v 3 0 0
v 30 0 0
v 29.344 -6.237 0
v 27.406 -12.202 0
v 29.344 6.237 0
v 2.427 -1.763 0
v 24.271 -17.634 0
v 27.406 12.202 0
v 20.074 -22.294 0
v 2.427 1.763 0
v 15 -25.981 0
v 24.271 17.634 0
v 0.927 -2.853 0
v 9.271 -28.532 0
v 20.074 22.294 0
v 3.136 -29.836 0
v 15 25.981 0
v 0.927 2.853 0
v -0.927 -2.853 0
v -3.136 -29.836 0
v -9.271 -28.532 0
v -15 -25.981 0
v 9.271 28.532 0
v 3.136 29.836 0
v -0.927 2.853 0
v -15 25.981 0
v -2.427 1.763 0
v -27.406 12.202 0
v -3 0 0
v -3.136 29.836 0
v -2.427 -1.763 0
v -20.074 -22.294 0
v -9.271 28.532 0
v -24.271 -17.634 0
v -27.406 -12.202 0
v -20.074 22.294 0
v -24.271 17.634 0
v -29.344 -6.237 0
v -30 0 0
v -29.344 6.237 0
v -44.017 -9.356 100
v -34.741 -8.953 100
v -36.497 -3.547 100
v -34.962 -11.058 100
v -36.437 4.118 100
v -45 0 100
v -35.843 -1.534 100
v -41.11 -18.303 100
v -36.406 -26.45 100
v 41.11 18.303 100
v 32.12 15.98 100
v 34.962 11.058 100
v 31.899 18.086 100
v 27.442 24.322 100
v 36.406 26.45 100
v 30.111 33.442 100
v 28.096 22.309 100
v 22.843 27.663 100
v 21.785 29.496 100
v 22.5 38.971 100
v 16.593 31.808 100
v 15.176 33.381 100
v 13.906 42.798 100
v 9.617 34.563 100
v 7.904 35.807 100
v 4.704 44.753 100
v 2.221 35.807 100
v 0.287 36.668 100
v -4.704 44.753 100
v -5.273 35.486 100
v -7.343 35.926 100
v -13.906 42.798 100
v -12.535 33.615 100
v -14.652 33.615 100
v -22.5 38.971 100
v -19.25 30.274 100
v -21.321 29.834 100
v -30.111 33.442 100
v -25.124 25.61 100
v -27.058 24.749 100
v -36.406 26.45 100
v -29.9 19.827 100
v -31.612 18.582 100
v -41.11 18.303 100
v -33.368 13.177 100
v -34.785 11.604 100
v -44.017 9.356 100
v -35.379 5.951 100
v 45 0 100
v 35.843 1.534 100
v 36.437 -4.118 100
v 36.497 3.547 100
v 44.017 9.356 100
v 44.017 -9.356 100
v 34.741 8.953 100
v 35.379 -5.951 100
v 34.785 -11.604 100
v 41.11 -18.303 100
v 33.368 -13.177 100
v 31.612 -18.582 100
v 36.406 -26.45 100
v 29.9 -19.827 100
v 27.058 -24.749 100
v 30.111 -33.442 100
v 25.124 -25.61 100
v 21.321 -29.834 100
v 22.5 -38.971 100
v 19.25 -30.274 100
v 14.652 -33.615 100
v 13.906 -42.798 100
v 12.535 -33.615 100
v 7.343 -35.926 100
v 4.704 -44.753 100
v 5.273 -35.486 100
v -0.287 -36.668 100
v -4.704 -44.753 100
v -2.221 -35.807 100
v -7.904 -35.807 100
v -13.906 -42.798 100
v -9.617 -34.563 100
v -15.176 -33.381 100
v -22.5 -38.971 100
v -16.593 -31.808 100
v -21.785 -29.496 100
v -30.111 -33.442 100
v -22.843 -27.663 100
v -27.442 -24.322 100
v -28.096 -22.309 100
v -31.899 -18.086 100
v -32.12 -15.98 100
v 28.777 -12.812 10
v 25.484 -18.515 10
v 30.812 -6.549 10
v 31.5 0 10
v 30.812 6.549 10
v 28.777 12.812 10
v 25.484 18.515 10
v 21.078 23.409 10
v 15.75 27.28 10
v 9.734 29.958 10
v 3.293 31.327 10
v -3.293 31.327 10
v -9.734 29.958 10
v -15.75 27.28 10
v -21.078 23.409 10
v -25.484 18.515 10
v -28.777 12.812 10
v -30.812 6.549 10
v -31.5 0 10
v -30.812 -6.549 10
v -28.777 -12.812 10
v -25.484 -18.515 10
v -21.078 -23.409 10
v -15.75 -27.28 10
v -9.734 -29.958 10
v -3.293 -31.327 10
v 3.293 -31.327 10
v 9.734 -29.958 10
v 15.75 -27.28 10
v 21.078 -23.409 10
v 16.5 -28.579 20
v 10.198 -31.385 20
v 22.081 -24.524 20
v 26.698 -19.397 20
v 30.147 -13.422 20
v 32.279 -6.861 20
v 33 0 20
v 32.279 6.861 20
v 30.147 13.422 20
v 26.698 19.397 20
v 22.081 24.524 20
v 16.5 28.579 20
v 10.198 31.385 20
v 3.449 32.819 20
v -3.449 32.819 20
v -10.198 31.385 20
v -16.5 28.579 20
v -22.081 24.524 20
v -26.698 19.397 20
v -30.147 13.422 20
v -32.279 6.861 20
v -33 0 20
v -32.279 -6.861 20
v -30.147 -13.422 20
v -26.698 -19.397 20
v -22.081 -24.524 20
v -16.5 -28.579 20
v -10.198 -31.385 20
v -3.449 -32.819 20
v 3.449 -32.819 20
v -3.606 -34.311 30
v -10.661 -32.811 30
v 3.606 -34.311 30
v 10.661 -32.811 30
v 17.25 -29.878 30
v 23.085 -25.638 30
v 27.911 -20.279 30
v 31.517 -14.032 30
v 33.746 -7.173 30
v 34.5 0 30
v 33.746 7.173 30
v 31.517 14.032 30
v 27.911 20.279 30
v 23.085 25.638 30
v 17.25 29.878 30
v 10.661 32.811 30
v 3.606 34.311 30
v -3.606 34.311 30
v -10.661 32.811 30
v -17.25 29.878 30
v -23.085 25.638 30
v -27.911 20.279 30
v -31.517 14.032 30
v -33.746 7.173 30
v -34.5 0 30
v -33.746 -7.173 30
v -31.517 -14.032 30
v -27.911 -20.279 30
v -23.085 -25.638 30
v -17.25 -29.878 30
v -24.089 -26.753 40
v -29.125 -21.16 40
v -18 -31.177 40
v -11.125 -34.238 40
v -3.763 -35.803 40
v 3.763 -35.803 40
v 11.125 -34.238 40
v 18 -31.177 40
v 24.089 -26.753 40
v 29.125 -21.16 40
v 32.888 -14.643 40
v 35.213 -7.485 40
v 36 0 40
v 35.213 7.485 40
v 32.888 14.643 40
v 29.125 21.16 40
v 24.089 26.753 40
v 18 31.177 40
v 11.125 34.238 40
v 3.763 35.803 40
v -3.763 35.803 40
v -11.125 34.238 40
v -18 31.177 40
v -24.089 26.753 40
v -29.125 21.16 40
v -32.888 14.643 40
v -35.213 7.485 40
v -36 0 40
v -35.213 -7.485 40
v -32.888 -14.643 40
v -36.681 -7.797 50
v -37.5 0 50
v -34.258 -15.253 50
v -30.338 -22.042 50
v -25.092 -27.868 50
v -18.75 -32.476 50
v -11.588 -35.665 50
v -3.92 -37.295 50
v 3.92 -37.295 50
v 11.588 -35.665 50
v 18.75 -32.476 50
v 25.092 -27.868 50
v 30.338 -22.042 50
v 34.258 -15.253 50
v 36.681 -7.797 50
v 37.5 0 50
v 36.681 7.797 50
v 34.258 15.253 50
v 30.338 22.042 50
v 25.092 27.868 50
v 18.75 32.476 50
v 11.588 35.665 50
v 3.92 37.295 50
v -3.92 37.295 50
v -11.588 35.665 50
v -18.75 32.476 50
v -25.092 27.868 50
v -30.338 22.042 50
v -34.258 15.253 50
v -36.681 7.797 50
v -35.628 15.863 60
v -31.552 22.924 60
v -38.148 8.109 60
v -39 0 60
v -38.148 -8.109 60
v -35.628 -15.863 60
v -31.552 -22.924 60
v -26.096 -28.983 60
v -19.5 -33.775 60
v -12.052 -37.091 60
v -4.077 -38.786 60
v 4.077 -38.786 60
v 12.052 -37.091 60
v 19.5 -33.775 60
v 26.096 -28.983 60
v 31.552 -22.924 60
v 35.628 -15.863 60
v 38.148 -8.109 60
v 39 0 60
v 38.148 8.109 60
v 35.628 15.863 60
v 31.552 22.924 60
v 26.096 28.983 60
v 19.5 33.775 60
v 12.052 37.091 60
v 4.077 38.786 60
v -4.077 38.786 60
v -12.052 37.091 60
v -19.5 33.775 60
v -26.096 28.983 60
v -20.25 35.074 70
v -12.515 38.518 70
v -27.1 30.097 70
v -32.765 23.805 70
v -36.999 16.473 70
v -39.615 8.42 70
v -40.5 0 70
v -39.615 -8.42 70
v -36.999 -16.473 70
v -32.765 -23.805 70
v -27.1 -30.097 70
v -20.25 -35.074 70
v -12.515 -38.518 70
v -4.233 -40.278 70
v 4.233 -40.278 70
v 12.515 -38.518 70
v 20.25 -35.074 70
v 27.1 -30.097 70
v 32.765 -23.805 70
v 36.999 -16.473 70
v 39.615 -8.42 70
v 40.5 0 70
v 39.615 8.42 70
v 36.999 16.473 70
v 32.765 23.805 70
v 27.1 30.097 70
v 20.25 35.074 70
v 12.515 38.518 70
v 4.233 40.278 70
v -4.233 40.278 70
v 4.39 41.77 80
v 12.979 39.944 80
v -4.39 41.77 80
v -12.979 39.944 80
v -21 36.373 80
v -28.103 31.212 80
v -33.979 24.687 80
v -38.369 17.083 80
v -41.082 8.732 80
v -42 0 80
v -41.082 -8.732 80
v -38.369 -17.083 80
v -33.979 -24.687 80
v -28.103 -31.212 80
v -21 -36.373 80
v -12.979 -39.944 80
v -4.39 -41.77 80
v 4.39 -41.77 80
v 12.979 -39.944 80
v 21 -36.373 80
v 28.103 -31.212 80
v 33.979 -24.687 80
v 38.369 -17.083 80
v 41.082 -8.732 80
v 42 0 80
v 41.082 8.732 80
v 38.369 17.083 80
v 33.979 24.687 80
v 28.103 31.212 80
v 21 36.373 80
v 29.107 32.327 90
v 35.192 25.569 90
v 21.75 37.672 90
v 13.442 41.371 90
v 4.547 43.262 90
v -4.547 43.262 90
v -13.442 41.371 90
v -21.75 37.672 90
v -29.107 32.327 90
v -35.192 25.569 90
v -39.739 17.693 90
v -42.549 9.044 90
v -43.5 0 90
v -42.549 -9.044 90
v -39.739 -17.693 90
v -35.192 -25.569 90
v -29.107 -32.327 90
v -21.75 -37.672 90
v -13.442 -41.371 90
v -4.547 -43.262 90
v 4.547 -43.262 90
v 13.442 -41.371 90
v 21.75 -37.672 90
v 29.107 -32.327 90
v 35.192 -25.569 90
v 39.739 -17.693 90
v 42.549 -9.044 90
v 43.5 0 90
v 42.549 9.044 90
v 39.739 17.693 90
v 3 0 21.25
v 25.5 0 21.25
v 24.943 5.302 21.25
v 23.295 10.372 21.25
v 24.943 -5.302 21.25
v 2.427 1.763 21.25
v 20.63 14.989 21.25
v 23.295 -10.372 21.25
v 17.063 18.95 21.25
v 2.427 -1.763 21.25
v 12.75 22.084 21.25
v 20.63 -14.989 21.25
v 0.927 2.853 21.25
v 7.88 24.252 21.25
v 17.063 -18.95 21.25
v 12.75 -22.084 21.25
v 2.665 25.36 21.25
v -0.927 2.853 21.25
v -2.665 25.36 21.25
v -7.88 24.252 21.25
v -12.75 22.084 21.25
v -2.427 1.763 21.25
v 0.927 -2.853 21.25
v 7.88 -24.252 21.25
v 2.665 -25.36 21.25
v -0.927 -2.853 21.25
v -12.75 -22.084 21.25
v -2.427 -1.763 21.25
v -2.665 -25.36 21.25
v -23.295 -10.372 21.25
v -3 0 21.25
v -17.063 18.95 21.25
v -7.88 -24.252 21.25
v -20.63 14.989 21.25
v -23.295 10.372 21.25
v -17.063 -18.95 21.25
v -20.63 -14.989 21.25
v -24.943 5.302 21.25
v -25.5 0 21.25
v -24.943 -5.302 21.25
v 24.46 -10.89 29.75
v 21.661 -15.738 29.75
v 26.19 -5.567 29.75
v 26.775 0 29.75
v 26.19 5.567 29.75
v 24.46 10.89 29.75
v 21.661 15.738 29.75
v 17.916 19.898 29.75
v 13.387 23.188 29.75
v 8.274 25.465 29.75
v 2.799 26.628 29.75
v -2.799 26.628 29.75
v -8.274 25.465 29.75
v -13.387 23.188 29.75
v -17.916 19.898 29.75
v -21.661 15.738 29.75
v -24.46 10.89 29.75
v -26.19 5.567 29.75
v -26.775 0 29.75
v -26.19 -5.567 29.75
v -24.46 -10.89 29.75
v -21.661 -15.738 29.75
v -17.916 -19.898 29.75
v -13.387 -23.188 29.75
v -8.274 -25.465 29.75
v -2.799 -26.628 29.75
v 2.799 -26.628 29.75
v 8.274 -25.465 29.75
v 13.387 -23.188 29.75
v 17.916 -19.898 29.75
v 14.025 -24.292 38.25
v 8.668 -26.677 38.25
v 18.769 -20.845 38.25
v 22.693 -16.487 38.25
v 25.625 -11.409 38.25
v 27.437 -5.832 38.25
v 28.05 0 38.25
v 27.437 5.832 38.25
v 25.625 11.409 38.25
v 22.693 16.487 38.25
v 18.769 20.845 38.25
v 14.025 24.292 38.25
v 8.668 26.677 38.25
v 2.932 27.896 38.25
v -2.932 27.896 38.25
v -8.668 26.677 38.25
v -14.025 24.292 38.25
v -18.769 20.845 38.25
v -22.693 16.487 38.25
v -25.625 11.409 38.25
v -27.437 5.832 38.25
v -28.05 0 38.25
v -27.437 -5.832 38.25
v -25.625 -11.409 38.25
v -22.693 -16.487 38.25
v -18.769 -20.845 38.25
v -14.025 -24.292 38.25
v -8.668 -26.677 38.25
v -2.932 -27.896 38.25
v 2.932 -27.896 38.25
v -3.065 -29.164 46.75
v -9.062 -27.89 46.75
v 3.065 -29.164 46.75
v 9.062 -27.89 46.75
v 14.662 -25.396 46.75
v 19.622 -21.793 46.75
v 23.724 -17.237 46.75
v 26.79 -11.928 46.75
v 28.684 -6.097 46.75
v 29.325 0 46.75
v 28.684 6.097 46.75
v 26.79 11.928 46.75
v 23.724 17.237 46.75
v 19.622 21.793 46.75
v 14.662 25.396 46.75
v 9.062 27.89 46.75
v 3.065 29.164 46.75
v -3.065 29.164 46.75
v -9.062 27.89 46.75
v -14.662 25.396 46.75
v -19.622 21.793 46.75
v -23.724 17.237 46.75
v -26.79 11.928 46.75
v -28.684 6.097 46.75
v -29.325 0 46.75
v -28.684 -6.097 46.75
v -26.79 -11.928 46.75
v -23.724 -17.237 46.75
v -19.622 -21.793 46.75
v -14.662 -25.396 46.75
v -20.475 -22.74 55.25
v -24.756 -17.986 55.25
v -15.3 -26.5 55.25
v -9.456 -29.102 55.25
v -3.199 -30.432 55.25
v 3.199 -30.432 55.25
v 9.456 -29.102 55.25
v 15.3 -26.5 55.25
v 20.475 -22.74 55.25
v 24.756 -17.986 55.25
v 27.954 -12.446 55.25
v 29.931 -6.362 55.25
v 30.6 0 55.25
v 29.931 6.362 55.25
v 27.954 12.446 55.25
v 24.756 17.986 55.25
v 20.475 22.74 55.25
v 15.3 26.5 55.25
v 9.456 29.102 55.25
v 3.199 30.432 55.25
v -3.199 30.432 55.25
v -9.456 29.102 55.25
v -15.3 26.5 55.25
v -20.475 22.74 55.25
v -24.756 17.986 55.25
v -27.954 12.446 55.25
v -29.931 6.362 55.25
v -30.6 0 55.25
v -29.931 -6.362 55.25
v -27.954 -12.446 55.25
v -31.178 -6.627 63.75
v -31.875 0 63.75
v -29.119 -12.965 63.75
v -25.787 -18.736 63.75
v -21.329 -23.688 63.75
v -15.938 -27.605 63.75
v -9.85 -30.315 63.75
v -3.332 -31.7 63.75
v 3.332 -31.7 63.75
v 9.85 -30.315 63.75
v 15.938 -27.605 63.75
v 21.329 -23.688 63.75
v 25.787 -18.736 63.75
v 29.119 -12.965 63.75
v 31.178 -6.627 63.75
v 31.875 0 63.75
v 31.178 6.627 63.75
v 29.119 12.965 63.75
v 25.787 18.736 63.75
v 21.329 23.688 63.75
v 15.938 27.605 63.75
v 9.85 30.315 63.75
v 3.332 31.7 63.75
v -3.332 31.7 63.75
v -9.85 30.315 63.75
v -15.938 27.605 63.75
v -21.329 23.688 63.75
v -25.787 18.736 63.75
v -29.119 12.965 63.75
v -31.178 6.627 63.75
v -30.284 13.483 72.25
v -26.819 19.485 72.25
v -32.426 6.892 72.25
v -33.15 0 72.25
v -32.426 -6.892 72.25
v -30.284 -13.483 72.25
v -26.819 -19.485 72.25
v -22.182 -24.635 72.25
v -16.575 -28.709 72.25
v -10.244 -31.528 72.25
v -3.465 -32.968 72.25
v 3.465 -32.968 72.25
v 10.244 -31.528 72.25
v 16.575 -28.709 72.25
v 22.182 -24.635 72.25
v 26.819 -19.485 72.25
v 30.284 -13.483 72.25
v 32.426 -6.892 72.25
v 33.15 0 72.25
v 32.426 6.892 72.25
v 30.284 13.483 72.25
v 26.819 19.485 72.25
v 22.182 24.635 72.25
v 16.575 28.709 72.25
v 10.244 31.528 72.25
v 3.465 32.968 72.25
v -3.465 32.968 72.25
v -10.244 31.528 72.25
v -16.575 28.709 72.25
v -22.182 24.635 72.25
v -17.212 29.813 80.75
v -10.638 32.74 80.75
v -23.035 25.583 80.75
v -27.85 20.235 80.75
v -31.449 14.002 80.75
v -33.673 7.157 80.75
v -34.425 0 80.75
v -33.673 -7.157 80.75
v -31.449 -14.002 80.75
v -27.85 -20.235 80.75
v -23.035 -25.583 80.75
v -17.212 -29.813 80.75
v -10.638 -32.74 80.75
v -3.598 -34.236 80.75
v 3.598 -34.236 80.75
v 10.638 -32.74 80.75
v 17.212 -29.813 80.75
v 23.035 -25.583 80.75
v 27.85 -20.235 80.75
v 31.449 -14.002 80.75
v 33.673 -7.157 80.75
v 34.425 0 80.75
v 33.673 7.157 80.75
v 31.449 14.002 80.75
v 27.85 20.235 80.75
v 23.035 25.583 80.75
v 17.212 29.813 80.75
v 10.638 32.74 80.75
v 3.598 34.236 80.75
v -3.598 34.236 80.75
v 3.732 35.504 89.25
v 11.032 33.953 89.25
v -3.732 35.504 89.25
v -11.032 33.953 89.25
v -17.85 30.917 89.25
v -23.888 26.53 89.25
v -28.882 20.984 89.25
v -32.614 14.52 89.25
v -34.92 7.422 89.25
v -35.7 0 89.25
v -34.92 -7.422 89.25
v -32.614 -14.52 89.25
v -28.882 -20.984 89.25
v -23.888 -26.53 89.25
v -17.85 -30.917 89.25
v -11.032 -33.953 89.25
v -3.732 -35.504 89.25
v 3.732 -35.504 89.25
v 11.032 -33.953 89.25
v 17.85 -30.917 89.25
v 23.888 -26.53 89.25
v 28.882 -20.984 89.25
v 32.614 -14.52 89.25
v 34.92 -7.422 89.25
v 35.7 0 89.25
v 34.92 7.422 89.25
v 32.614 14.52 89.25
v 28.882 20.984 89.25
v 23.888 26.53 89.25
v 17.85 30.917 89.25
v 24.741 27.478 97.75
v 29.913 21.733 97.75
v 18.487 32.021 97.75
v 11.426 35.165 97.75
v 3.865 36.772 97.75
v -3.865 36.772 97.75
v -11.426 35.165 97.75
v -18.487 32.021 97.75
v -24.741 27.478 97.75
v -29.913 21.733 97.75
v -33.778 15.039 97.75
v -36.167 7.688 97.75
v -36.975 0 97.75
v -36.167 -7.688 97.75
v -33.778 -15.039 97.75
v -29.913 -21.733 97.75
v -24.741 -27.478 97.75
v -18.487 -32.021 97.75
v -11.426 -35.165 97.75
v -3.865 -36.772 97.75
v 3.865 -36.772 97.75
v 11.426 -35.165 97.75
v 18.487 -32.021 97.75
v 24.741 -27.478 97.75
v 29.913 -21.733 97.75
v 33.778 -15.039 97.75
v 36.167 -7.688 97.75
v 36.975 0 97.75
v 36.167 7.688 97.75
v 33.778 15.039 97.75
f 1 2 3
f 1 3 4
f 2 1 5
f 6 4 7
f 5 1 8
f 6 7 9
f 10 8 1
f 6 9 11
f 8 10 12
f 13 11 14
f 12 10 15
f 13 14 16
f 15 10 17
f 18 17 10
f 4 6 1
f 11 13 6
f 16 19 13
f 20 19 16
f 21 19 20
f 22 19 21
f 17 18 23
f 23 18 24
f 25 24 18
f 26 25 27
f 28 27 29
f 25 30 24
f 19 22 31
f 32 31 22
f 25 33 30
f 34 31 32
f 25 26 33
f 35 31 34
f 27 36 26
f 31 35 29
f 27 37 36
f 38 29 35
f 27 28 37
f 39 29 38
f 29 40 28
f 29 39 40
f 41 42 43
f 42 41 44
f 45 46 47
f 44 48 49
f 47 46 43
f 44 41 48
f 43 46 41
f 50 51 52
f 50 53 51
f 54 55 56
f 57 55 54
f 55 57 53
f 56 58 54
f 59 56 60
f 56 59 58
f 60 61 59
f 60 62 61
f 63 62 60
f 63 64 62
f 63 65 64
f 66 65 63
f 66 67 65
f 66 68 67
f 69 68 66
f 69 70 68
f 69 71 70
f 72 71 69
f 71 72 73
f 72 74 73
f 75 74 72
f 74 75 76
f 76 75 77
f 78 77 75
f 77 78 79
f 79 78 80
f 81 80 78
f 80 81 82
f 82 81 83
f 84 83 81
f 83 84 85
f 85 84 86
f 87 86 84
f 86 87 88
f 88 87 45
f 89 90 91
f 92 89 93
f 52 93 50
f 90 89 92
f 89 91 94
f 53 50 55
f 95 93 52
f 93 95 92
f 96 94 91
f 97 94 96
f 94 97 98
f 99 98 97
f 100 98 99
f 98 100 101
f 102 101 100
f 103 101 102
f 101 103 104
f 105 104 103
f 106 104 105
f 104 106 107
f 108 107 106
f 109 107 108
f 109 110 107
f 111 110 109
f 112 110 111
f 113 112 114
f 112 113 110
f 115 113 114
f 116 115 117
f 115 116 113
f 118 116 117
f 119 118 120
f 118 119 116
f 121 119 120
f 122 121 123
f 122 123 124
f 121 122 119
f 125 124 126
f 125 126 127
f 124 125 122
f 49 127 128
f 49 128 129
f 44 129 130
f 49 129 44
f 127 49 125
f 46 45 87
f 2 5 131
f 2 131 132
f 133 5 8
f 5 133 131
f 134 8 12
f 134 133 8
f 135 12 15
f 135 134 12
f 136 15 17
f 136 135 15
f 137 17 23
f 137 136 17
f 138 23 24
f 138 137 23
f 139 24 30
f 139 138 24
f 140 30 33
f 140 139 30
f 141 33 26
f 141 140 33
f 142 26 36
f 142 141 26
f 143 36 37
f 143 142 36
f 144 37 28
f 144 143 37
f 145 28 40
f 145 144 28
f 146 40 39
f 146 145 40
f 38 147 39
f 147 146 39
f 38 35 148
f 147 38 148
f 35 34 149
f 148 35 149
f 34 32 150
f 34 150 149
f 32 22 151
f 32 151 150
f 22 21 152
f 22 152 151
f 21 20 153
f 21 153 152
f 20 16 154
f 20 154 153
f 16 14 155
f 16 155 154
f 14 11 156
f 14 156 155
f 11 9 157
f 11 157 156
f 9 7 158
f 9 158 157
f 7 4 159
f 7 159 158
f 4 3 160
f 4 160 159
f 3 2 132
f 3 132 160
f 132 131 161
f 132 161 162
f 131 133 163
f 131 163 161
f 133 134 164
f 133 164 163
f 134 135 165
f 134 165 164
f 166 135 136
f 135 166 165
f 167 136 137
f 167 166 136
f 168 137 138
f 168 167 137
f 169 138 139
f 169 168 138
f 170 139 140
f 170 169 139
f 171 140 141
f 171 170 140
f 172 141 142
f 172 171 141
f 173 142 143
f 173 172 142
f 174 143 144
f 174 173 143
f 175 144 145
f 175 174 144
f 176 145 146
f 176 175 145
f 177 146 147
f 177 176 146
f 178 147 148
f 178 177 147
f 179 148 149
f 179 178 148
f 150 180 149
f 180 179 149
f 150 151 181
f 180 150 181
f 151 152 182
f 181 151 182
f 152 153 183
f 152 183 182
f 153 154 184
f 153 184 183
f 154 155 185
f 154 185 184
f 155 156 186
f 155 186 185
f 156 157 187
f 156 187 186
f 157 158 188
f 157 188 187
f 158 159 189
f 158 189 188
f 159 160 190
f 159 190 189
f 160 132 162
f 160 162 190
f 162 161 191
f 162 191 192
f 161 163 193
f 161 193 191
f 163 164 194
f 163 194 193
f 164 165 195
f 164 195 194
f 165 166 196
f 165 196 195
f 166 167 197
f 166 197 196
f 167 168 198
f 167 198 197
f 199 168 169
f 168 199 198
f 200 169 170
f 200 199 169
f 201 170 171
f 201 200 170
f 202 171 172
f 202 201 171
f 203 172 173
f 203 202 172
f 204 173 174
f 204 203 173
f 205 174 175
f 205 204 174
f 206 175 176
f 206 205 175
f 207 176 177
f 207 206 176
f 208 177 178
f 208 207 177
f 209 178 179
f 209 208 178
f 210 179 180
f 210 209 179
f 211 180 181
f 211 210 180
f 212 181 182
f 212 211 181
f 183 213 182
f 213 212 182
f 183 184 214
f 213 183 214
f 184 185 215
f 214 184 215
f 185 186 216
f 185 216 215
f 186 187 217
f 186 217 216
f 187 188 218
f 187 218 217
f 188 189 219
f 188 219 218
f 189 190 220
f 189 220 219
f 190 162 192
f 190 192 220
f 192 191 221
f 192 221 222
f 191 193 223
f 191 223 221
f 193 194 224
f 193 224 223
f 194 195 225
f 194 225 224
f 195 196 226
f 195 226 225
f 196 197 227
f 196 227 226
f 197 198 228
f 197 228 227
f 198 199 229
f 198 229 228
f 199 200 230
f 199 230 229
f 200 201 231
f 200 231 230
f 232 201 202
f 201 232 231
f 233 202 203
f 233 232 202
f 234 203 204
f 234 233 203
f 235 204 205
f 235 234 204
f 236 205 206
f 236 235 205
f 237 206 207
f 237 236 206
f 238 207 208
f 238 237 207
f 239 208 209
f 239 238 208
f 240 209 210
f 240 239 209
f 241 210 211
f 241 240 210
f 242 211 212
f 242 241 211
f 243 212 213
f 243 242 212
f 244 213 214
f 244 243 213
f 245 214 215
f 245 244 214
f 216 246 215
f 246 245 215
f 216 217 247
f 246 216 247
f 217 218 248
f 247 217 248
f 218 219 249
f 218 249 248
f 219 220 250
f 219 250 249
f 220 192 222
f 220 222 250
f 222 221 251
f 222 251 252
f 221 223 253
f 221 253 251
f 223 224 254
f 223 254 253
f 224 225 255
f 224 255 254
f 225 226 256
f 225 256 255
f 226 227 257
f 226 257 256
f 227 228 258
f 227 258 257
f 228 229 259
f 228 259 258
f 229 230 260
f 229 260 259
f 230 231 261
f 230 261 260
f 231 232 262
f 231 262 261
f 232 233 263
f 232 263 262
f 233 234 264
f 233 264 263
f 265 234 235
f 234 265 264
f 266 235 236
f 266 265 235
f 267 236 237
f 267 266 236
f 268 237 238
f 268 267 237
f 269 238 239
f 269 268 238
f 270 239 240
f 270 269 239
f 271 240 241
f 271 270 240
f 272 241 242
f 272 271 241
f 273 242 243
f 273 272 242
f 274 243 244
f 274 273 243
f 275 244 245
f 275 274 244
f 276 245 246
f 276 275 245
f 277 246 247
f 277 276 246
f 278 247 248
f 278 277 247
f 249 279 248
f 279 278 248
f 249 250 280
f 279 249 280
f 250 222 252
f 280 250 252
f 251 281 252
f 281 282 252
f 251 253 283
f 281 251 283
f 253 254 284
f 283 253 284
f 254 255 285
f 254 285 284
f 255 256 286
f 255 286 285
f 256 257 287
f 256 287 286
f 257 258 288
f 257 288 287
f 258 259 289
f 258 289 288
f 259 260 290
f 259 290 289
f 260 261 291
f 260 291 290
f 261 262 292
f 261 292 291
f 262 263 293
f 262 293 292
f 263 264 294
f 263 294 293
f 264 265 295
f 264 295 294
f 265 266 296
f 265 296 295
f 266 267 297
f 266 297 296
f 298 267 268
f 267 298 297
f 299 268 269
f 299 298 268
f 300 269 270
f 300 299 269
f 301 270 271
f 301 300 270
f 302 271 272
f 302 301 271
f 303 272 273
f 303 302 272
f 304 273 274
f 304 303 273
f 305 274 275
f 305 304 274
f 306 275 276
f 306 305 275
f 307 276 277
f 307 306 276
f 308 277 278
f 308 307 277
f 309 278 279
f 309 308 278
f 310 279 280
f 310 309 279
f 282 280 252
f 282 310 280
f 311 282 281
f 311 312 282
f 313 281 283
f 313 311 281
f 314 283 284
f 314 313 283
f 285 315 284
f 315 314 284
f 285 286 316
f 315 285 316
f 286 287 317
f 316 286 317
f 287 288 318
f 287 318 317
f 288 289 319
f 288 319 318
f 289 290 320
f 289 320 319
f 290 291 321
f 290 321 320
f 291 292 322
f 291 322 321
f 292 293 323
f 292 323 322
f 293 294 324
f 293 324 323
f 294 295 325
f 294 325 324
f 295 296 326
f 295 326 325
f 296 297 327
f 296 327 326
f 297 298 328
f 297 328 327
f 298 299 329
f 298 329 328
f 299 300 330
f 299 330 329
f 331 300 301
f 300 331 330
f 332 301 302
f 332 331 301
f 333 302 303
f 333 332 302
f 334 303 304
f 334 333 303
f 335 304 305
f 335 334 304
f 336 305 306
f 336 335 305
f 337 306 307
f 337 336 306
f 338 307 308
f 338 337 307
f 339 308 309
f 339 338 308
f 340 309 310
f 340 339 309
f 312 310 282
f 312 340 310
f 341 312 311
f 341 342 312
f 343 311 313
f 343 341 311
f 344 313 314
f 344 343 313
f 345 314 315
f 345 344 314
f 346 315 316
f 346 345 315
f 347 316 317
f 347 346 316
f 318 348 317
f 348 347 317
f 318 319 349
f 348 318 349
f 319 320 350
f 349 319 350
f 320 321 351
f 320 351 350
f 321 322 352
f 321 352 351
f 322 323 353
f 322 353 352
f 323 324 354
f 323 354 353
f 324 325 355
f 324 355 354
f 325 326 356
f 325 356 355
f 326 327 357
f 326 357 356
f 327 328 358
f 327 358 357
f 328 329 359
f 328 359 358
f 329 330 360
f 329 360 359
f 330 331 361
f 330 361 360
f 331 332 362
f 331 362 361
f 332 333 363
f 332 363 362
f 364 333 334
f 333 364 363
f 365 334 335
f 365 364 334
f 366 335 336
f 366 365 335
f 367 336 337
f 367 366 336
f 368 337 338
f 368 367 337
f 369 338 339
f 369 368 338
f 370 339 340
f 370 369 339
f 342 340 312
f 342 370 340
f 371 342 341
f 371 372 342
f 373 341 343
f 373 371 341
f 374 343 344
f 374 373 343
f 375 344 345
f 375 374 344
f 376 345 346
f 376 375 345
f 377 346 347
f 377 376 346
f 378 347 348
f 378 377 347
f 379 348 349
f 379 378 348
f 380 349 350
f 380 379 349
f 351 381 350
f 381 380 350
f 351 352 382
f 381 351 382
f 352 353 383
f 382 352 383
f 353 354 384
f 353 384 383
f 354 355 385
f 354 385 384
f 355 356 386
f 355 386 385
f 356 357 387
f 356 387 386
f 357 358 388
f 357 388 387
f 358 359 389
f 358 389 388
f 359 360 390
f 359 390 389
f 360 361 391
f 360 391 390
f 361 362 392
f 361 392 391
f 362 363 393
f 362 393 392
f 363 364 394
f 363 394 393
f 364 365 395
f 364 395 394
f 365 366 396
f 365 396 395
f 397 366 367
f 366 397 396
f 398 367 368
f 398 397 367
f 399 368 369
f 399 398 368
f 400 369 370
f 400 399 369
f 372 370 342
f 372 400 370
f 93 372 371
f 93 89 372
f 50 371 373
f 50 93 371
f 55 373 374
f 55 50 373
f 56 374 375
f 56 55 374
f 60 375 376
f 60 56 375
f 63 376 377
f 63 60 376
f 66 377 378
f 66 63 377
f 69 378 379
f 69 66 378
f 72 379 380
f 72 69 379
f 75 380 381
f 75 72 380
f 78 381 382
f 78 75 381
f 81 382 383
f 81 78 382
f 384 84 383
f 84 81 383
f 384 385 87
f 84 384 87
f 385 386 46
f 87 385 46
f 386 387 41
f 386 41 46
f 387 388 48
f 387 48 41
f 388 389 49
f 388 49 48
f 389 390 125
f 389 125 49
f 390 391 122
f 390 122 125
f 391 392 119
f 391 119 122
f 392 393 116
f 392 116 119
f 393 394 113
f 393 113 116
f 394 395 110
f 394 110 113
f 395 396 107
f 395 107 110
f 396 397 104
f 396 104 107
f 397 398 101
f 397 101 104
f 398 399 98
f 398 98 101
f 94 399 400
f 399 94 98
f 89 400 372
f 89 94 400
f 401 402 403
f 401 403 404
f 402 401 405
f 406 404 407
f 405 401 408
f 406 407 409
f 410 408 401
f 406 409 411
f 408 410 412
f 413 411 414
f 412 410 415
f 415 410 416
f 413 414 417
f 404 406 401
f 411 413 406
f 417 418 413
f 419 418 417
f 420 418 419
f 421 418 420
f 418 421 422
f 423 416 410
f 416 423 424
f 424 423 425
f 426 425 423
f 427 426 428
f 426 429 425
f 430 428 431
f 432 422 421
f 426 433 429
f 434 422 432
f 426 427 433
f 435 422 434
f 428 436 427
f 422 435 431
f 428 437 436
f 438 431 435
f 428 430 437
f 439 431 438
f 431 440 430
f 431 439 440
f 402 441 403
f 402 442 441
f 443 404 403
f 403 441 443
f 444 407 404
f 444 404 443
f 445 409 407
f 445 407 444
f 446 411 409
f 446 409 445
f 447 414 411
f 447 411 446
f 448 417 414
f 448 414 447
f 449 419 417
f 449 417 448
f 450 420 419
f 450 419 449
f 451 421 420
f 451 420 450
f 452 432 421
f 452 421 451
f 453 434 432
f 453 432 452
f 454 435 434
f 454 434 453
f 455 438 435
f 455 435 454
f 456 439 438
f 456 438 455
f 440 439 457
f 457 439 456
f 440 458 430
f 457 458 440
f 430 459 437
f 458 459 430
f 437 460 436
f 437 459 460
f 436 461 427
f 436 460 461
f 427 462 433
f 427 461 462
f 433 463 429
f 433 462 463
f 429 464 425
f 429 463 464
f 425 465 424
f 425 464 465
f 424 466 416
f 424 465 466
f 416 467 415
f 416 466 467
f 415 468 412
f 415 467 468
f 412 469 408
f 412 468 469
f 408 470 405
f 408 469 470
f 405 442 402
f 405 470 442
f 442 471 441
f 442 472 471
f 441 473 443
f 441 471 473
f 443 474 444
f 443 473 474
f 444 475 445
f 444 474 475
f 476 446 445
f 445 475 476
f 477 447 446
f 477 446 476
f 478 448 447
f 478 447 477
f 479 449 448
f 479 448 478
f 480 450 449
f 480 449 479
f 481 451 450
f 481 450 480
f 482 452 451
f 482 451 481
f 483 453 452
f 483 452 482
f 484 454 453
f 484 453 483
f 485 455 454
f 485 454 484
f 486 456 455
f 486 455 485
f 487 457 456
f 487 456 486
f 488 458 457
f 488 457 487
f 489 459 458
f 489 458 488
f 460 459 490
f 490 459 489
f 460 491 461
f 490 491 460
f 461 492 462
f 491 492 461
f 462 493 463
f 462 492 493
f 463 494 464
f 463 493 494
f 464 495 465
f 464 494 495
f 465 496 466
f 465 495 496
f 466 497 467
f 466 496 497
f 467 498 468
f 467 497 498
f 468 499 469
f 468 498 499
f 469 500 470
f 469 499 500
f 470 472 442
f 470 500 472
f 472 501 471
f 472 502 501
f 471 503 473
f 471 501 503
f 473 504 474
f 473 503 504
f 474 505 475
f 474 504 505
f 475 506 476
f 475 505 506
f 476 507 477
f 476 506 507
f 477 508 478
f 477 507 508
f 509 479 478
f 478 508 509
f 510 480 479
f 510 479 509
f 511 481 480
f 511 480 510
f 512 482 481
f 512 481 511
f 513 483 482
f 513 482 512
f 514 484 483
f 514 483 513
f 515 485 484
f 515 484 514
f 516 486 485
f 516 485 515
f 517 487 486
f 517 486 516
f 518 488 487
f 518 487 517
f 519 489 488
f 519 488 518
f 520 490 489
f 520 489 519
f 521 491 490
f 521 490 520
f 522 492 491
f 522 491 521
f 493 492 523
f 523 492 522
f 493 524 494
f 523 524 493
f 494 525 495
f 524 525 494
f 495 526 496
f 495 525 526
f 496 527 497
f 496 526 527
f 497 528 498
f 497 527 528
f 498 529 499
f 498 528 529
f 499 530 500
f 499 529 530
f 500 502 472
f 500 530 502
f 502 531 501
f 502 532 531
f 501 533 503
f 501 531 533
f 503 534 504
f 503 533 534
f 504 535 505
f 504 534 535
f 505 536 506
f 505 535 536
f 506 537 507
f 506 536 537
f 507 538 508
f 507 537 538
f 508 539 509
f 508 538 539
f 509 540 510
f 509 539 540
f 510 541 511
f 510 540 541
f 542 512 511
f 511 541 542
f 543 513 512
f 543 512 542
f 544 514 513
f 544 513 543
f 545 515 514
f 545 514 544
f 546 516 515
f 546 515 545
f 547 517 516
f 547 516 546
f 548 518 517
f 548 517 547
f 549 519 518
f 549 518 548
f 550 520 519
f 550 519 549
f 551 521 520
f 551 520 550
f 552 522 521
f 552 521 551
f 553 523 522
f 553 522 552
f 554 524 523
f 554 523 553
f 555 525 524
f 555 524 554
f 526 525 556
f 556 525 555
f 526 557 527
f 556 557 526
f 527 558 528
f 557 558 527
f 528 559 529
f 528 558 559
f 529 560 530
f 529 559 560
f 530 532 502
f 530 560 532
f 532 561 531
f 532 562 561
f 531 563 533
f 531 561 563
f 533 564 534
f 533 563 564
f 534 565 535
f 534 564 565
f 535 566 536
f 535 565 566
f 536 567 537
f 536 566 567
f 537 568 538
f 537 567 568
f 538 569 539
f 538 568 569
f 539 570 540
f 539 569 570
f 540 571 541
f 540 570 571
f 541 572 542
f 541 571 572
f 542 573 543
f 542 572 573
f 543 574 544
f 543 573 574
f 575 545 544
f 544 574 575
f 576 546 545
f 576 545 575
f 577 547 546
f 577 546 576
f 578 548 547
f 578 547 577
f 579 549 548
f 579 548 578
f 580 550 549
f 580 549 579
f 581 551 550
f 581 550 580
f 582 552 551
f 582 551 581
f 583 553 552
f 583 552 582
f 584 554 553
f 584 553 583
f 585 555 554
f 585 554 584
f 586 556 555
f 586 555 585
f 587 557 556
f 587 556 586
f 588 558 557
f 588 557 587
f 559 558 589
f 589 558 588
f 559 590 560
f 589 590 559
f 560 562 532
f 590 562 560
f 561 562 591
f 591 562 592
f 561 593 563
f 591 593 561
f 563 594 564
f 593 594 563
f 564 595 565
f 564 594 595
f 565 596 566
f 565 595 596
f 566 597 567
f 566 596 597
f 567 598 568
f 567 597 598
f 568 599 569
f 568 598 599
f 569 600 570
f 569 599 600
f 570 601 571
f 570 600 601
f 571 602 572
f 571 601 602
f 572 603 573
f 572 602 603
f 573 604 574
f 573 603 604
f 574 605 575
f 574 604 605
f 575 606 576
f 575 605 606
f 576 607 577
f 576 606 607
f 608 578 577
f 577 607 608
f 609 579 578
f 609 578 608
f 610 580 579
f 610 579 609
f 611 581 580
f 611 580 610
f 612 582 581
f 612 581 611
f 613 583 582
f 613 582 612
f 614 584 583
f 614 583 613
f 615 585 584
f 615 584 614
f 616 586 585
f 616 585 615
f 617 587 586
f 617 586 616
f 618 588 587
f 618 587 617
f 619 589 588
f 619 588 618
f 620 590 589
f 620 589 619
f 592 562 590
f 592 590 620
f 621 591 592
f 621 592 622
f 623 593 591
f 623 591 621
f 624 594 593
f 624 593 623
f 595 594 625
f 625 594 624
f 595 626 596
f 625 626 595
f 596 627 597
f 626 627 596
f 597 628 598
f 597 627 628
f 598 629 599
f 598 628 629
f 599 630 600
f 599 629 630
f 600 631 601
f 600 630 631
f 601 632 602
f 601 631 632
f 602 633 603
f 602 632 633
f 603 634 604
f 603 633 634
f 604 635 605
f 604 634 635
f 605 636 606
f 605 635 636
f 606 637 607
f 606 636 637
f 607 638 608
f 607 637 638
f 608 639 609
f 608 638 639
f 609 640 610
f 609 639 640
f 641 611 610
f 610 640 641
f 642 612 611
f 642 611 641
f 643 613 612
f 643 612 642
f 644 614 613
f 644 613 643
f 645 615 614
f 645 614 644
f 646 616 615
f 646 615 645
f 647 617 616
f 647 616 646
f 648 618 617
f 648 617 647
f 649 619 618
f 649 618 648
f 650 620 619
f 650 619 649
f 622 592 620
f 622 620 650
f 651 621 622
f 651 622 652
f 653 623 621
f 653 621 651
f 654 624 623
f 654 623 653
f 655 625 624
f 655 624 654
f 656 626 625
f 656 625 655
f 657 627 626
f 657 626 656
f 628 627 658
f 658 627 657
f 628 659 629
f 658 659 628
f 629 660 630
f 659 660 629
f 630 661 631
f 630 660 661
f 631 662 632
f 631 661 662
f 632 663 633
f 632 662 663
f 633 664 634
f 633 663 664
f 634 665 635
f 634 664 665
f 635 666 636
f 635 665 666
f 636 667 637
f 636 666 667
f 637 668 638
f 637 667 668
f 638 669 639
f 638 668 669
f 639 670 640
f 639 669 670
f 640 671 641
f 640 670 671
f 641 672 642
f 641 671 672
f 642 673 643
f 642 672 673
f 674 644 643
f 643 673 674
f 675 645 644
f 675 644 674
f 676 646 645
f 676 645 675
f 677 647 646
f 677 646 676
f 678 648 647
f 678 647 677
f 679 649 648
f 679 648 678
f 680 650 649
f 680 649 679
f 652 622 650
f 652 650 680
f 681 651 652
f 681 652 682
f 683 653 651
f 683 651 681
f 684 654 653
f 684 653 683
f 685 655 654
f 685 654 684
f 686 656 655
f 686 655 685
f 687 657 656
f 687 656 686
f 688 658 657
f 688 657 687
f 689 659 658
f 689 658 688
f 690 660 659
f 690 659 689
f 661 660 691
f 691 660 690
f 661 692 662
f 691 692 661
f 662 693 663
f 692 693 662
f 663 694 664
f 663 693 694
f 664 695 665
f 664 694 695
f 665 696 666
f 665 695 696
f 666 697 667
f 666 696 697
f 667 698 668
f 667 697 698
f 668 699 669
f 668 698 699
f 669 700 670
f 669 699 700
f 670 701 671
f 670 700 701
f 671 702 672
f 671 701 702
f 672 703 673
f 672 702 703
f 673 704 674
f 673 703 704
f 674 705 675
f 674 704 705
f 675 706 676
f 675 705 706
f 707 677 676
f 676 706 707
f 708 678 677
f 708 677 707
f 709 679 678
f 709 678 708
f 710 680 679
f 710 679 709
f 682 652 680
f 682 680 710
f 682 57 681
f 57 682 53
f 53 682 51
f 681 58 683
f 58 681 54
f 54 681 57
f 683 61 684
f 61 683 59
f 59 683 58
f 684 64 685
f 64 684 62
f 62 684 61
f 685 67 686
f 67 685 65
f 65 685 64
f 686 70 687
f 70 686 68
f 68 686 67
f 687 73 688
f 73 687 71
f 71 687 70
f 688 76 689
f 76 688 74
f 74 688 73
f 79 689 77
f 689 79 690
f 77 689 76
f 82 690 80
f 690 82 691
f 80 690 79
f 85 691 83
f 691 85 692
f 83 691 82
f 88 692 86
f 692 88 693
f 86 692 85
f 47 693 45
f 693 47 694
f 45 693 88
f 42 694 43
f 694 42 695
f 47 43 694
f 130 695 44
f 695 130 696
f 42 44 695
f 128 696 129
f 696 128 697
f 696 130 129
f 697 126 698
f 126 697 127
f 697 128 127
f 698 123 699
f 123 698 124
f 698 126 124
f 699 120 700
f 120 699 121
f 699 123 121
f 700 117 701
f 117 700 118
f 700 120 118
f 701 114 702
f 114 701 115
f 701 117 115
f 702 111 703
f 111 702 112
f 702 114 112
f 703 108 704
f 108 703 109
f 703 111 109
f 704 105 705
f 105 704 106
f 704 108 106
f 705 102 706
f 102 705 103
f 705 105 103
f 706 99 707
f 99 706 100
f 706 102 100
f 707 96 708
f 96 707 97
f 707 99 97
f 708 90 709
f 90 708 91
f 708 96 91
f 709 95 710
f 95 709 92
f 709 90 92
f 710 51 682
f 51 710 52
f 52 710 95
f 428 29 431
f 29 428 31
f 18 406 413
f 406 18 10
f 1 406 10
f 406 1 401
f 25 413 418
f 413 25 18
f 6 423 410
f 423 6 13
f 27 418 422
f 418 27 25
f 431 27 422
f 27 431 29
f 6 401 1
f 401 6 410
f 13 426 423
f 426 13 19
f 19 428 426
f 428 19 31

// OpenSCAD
Height = 100;
Twist = 360;
Scale = 1.5;
Slices = 10;
Radius = 30;
//Set to 0 if not hole desired
HoleRadius = 3;

difference(){
    translate([0, 0, Height/2]){
        linear_extrude(height = Height, twist = Twist, scale = Scale, center = true, slices = Slices)
            circle(Radius);
    }
    scale([0.85,0.85,0.85]){
        translate([0, 0, Height*.75]){
            linear_extrude(height = Height, twist = Twist, scale = Scale,        center = true, slices = Slices)
                circle(Radius);
        }
    }
    cylinder(100, HoleRadius, HoleRadius, center=true);
}
